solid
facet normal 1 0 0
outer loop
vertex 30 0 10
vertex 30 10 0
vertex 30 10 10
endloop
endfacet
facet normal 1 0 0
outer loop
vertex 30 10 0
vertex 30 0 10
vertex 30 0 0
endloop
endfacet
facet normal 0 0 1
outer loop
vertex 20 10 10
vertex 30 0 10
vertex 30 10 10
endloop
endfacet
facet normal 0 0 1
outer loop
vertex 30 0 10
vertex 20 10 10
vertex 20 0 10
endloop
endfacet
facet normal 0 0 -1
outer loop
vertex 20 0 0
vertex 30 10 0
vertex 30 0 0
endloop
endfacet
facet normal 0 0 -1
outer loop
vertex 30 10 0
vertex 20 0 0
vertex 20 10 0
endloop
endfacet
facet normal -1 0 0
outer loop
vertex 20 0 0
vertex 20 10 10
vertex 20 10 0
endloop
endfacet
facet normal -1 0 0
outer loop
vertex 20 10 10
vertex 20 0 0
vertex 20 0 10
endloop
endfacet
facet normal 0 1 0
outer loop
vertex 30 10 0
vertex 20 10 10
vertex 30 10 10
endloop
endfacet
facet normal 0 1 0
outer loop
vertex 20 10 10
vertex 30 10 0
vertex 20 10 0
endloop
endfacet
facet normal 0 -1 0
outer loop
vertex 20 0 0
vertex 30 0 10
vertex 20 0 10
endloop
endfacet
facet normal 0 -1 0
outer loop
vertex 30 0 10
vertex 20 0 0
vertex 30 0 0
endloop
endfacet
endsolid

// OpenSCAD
// An open (not closed) surface unioned with a solid.
// The pyramid is missing its fourth side and its base, so the manifold backend
// cannot close it and drops it from the result. Export must report the
// non_manifold issue instead of claiming the mesh is print-ready.
union() {
  polyhedron(
    points = [[0, 0, 0], [10, 0, 0], [10, 10, 0], [0, 10, 0], [5, 5, 10]],
    faces = [[0, 1, 4], [1, 2, 4], [2, 3, 4]]
  );
  translate([20, 0, 0]) cube([10, 10, 10]);
}
